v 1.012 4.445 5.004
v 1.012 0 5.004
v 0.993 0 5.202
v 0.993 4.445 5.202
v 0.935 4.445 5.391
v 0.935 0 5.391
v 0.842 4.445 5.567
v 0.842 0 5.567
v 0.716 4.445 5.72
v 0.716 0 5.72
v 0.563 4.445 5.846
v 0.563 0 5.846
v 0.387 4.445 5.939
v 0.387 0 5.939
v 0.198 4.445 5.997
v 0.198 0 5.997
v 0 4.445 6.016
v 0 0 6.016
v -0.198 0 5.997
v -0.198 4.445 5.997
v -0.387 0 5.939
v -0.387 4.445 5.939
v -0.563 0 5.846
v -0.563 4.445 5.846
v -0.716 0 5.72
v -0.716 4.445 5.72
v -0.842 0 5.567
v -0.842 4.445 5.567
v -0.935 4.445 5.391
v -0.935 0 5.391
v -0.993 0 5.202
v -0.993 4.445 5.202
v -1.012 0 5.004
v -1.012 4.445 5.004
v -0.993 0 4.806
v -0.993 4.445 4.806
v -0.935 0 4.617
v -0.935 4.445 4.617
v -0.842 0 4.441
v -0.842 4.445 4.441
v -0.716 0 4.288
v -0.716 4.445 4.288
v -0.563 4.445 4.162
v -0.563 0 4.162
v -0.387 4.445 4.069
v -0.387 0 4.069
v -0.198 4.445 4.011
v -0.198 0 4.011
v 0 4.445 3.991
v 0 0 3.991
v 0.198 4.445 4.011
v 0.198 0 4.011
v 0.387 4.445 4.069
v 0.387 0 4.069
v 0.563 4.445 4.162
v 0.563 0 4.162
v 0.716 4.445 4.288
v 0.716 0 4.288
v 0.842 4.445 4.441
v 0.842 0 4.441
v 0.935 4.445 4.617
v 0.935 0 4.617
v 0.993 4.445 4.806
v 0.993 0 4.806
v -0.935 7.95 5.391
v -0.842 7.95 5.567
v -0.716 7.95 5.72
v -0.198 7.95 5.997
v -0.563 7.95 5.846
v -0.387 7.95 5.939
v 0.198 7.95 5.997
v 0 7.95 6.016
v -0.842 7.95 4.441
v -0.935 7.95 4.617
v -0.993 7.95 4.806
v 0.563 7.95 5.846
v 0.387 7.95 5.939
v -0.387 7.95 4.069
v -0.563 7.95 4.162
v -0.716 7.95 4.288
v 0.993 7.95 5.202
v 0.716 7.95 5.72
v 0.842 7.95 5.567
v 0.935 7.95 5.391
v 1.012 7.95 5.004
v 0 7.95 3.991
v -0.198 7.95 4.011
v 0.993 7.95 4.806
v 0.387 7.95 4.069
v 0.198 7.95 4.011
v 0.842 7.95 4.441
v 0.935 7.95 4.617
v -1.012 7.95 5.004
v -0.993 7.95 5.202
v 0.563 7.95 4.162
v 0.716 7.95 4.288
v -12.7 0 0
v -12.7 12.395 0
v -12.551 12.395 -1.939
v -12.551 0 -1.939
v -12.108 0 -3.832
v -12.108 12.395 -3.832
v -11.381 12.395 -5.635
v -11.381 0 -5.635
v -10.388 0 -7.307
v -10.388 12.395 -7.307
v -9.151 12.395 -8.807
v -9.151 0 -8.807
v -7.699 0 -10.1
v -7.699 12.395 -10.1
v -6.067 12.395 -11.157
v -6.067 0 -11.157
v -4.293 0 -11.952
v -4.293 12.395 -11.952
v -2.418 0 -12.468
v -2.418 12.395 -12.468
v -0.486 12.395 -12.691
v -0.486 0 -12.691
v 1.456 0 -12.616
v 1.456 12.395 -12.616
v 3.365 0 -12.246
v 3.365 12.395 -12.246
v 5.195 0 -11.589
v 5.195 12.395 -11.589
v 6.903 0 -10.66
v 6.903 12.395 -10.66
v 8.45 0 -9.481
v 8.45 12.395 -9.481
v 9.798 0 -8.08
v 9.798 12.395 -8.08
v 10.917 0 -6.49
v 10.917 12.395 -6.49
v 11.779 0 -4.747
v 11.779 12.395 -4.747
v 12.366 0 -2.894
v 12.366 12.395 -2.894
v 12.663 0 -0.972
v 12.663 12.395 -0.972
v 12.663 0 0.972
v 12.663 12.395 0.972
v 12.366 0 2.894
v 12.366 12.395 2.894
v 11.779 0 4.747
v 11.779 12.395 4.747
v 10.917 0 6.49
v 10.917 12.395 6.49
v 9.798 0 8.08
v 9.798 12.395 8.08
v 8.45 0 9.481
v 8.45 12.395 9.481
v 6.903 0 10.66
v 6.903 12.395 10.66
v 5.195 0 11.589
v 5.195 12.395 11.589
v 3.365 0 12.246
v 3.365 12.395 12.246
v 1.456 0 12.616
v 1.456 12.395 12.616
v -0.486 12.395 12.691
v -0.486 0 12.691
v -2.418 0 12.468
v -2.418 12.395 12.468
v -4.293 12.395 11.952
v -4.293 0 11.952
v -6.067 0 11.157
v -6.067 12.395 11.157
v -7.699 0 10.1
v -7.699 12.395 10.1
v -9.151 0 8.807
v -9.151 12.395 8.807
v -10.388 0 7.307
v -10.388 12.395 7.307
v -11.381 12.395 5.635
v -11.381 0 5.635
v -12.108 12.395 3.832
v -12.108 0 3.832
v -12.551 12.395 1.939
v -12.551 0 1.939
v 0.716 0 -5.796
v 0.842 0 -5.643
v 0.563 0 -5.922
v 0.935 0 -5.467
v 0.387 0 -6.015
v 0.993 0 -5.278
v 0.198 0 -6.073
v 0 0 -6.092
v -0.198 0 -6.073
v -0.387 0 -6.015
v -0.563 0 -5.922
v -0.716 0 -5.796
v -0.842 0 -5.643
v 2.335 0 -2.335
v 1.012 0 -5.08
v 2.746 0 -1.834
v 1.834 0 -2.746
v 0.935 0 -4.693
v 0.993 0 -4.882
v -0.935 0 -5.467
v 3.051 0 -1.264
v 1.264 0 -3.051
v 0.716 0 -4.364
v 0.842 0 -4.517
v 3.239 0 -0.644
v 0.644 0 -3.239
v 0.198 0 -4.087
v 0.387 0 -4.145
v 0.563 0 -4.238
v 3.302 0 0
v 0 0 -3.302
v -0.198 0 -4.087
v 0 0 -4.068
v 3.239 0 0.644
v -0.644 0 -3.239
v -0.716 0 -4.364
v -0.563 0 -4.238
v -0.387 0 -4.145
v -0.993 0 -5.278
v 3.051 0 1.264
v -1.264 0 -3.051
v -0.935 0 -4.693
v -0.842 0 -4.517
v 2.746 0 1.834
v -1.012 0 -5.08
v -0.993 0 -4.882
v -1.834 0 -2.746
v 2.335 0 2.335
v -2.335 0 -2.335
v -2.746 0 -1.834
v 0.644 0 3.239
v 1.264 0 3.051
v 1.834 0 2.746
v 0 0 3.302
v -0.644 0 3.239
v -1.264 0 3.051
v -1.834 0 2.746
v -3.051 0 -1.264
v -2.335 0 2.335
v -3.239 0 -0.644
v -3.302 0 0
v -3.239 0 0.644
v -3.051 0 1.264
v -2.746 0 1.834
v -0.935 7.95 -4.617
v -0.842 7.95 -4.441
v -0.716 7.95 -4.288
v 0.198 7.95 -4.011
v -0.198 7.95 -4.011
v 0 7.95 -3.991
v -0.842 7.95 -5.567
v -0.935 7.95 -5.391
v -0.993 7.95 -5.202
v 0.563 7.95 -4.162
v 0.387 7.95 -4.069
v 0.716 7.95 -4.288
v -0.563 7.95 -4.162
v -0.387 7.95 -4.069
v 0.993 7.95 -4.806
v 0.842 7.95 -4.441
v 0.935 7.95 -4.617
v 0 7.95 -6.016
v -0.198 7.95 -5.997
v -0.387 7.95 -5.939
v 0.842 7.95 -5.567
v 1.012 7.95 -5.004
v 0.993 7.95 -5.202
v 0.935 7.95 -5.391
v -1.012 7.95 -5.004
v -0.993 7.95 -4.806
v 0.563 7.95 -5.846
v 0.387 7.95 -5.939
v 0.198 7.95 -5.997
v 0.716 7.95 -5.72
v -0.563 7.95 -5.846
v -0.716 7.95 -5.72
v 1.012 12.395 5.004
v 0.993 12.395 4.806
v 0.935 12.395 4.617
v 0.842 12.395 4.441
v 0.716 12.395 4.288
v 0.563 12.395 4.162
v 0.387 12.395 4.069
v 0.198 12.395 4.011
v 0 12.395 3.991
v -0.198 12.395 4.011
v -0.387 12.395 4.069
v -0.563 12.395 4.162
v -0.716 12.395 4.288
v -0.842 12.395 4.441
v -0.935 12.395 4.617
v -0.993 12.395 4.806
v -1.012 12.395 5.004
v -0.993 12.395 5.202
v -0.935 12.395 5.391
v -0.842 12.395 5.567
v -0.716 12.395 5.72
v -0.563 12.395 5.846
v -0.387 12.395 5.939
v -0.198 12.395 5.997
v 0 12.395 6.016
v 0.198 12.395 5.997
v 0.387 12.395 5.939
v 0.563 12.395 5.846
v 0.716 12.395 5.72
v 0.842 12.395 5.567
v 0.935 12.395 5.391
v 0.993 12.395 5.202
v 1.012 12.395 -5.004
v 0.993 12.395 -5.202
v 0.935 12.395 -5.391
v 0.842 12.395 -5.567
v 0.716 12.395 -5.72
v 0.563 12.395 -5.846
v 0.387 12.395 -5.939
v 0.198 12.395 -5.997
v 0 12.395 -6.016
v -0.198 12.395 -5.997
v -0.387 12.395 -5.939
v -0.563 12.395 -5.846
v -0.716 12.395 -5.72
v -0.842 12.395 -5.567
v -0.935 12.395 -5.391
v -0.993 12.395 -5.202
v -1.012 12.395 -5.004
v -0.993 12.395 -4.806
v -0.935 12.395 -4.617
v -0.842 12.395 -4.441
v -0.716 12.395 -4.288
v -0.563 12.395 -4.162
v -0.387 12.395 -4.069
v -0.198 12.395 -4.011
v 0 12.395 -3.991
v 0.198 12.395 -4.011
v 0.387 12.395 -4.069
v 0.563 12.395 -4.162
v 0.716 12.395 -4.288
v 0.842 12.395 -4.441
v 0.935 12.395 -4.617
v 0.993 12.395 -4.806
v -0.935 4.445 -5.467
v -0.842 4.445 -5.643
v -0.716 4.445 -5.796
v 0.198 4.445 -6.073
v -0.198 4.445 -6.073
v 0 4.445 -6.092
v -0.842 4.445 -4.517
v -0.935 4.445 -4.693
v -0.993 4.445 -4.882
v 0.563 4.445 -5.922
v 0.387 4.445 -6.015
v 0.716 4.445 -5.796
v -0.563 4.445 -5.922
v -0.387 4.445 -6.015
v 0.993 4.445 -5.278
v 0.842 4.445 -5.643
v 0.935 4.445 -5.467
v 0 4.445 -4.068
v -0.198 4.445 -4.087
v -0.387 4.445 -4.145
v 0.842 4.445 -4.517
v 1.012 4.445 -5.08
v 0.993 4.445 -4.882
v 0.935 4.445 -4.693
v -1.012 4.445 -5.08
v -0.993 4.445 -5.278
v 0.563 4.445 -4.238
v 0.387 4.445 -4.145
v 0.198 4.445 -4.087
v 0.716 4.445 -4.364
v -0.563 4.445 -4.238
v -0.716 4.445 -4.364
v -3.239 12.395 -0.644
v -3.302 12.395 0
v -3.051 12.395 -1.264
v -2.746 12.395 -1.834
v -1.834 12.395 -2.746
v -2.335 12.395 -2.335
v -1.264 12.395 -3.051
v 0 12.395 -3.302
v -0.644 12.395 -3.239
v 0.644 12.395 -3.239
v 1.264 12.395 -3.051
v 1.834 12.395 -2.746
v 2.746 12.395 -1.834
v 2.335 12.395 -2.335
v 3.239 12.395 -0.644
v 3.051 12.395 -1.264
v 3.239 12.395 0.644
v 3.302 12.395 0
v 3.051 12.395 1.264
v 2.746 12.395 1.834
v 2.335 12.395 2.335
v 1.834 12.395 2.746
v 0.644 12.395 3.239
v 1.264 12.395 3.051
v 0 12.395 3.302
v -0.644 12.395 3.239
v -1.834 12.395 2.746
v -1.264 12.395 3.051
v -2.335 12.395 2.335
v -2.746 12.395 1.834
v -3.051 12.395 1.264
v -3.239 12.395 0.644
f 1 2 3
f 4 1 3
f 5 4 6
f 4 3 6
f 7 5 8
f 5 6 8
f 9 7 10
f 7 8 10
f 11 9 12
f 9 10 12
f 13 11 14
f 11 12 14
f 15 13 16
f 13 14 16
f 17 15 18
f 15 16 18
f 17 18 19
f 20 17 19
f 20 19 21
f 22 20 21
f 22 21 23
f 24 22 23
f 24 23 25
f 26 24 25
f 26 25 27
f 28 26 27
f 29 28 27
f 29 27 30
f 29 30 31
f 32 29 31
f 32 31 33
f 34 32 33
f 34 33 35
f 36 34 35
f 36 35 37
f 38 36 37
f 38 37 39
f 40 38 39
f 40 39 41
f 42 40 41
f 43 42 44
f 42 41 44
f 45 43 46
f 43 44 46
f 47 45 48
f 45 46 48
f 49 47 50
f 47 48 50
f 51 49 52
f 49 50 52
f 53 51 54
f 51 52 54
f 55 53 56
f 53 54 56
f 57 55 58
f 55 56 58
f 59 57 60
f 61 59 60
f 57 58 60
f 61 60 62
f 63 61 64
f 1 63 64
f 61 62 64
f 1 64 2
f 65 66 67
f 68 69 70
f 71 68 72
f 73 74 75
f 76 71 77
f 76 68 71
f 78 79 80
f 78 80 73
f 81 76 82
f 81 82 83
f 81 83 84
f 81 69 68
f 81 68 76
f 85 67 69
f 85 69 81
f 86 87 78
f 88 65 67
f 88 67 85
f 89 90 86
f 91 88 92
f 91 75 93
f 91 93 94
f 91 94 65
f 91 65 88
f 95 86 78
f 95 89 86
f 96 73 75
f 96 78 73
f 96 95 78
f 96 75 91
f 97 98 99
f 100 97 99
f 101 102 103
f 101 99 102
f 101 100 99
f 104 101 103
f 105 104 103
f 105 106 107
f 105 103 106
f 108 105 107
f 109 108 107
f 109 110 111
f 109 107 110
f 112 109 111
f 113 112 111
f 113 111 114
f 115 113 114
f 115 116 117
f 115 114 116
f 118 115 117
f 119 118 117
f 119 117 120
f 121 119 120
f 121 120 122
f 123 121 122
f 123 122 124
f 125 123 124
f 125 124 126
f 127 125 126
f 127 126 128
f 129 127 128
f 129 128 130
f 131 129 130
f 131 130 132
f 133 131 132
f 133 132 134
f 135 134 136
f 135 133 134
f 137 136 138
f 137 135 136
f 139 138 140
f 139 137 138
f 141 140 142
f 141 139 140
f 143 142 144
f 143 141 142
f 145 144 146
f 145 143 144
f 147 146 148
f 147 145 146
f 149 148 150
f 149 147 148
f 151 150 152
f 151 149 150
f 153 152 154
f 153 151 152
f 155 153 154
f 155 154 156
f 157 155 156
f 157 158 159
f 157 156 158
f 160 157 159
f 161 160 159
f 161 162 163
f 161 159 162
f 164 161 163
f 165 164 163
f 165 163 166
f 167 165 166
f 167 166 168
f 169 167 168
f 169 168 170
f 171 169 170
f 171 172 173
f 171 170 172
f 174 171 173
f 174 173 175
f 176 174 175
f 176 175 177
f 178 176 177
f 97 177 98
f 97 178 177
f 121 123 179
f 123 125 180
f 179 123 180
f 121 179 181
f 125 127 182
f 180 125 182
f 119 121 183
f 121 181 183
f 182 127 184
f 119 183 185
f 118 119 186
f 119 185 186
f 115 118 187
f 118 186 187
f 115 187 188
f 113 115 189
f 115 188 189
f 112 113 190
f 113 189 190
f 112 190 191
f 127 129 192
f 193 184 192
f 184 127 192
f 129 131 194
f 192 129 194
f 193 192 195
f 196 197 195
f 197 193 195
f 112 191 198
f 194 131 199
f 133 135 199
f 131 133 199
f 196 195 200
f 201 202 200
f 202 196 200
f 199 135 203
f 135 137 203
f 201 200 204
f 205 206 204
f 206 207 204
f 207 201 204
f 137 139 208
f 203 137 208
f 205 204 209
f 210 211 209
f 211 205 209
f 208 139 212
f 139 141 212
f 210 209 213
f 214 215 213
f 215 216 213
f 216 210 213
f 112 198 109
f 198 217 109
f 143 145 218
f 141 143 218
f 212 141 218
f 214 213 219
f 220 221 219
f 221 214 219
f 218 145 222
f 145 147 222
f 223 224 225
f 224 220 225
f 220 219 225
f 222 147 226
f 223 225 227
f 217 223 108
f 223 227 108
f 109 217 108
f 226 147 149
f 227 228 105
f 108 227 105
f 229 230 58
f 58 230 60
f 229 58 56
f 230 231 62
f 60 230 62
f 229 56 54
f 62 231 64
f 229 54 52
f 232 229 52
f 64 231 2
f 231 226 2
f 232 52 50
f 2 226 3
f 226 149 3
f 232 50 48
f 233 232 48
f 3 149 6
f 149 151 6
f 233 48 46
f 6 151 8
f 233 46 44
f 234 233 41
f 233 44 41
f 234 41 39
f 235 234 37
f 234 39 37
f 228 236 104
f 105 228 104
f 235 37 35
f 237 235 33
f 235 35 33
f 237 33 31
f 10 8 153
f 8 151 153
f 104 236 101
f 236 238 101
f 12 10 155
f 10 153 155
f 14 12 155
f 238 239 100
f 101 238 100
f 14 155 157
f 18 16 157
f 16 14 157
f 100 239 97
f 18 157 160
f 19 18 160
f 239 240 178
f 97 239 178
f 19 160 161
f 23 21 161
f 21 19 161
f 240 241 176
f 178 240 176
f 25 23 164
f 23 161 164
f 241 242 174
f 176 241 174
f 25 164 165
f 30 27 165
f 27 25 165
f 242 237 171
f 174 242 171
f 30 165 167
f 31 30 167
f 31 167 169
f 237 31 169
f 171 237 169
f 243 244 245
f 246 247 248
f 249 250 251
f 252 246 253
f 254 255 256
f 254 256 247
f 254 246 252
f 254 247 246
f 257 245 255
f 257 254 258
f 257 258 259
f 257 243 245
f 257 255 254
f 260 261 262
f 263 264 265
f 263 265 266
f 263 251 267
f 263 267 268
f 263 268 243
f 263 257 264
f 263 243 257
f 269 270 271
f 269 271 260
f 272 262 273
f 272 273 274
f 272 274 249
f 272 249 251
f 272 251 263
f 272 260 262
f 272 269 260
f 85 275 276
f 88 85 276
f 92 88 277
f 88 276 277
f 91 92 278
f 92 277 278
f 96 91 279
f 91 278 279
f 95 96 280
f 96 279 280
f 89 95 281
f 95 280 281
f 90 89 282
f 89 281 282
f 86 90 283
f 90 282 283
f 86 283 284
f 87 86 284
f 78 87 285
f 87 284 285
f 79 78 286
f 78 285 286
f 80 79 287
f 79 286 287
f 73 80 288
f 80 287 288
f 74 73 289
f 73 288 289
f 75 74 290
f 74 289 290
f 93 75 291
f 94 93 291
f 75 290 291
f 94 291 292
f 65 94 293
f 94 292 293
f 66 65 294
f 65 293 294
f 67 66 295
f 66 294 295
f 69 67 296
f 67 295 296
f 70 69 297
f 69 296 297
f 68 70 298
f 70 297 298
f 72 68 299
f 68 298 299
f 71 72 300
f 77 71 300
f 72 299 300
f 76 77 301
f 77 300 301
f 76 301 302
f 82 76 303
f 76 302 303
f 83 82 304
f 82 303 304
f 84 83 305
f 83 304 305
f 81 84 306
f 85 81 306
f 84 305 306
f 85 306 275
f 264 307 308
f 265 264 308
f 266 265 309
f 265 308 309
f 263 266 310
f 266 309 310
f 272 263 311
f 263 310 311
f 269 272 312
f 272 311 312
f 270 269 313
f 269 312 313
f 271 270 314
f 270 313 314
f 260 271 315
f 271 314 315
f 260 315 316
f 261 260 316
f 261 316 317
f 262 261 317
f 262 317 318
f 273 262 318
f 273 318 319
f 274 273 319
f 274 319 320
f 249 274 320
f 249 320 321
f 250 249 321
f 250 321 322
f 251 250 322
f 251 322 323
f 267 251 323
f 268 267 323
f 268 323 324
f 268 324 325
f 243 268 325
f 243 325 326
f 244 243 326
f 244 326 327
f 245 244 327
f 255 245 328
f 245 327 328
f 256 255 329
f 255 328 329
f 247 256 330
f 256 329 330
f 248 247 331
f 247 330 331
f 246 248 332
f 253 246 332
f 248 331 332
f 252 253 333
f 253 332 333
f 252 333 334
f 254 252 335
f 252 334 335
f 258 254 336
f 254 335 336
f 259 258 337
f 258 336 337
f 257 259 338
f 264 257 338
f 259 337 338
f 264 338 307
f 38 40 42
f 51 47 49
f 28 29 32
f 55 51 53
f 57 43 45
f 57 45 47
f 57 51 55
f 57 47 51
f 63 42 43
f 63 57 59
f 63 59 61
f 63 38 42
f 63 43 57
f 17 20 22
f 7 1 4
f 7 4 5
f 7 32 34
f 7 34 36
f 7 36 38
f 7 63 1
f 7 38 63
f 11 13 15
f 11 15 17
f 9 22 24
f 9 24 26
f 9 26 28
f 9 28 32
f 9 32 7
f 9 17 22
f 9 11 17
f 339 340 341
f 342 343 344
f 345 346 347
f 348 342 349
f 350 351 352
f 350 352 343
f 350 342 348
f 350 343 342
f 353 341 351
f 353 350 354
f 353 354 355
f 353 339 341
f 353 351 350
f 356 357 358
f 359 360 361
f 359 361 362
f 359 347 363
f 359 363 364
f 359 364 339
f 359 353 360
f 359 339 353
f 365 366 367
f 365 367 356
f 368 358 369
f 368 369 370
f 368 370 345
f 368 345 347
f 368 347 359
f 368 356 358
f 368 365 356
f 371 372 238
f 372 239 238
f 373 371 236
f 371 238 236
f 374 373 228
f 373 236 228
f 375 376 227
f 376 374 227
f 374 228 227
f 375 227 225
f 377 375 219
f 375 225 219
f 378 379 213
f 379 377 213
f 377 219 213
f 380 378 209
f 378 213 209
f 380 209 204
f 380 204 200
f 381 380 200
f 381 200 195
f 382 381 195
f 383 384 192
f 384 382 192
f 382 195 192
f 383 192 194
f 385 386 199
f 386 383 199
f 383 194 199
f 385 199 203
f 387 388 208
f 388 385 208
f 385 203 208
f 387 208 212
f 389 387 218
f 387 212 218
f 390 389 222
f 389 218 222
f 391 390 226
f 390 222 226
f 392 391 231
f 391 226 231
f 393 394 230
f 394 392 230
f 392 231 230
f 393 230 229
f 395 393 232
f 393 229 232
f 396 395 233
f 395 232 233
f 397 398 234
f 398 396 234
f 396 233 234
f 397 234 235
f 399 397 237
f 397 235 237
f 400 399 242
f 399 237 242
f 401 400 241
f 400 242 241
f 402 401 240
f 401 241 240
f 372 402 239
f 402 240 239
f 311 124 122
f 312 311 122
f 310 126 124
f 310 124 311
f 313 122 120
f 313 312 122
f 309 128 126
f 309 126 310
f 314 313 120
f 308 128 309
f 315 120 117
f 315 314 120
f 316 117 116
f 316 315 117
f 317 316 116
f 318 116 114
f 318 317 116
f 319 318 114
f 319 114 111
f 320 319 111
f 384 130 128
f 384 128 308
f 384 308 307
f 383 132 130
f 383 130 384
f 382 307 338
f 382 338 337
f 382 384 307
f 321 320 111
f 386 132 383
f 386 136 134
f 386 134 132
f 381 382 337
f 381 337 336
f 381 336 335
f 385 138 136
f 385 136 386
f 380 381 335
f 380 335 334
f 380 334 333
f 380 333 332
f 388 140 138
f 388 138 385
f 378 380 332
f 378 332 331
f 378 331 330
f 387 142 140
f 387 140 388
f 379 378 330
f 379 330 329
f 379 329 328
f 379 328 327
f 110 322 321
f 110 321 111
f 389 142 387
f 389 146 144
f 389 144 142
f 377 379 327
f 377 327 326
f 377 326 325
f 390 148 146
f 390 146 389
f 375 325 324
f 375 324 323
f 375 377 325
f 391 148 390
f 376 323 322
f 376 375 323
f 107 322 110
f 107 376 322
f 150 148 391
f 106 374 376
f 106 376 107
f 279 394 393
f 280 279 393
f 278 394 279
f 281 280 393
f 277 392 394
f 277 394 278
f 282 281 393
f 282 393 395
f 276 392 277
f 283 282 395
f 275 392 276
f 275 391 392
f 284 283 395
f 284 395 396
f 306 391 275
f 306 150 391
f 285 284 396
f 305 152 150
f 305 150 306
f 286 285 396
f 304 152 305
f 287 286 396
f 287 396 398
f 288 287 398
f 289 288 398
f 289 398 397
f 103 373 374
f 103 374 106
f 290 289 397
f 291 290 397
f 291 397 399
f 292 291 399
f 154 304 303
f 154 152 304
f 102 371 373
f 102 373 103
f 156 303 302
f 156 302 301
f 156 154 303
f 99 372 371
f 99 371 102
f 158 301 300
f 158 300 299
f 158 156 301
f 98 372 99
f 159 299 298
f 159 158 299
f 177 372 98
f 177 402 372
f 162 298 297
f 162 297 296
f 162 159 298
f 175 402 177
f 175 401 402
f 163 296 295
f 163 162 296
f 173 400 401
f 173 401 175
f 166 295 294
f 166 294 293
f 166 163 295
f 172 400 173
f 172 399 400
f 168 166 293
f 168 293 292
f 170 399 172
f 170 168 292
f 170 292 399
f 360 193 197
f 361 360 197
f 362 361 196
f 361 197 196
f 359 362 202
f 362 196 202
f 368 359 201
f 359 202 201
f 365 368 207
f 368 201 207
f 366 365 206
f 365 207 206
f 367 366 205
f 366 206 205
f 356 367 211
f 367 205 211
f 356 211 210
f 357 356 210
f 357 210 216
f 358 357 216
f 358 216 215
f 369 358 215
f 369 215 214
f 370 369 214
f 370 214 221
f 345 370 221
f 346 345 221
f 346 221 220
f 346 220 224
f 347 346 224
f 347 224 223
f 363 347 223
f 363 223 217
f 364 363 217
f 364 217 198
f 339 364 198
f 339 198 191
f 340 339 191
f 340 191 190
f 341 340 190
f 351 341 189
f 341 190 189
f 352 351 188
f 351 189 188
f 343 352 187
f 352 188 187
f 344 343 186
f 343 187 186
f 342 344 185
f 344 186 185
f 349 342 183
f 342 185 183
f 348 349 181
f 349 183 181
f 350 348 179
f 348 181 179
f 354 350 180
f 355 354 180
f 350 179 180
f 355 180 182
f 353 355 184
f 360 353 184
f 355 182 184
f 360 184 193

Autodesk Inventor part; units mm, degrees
ref_plane "YZ Plane" through (0, 0, 0) normal (1, 0, 0) x (0, 1, 0)
ref_plane "XZ Plane" through (0, 0, 0) normal (0, 1, 0) x (-1, 0, 0)
ref_plane "XY Plane" through (0, 0, 0) normal (0, 0, 1) x (1, 0, 0)
sketch "Sketch1" plane through (0, 0, 0) normal (0, 1, 0) x (-1, 0, 0)
  circle A0 centre (0, 0) radius 12.7
  circle A1 centre (0, 0) radius 3.302
  dimension "d0" = 25.4
  dimension "d1" = 6.604
extrude "Extrusion1" add sketch "Sketch1" along normal blind 12.3952
sketch "Sketch2" plane through (0, 12.3952, 0) normal (0, 1, 0) x (1, 0, 0)
  line L0 (0, 0) -> (0, -5.004)
  line L1 (0, -5.004) -> (0, 0)
  line L2 (0, 0) -> (0, 5.004)
  circle A0 centre (0, -5.004) radius 1.0125
  circle A1 centre (0, 5.004) radius 1.0125
  dimension "d4" = 5.004
  dimension "d5" = 5.004
  dimension "d6" = 2.025
  dimension "d7" = 2.025
extrude "Extrusion2" cut sketch "Sketch2" against normal blind 4.445
sketch "Sketch3" plane through (0, 0, 0) normal (0, -1, 0) x (1, 0, 0)
  line L0 (0, 0) -> (0, 5.004)
  line L1 (0, 5.004) -> (0, -5.08)
  circle A0 centre (0, 5.004) radius 1.0125
  line L2 (0, 0) -> (0, -5.004)
  circle A1 centre (0, -5.08) radius 1.0125
  dimension "d10" = 5.004
  dimension "d15" = 2.025
  dimension "d16" = 5.004
  dimension "d17" = 2.025
extrude "Extrusion3" cut sketch "Sketch3" against normal blind 4.445
properties part number "PolarisPost_HeightAdjustment_0p5in_Machined"
